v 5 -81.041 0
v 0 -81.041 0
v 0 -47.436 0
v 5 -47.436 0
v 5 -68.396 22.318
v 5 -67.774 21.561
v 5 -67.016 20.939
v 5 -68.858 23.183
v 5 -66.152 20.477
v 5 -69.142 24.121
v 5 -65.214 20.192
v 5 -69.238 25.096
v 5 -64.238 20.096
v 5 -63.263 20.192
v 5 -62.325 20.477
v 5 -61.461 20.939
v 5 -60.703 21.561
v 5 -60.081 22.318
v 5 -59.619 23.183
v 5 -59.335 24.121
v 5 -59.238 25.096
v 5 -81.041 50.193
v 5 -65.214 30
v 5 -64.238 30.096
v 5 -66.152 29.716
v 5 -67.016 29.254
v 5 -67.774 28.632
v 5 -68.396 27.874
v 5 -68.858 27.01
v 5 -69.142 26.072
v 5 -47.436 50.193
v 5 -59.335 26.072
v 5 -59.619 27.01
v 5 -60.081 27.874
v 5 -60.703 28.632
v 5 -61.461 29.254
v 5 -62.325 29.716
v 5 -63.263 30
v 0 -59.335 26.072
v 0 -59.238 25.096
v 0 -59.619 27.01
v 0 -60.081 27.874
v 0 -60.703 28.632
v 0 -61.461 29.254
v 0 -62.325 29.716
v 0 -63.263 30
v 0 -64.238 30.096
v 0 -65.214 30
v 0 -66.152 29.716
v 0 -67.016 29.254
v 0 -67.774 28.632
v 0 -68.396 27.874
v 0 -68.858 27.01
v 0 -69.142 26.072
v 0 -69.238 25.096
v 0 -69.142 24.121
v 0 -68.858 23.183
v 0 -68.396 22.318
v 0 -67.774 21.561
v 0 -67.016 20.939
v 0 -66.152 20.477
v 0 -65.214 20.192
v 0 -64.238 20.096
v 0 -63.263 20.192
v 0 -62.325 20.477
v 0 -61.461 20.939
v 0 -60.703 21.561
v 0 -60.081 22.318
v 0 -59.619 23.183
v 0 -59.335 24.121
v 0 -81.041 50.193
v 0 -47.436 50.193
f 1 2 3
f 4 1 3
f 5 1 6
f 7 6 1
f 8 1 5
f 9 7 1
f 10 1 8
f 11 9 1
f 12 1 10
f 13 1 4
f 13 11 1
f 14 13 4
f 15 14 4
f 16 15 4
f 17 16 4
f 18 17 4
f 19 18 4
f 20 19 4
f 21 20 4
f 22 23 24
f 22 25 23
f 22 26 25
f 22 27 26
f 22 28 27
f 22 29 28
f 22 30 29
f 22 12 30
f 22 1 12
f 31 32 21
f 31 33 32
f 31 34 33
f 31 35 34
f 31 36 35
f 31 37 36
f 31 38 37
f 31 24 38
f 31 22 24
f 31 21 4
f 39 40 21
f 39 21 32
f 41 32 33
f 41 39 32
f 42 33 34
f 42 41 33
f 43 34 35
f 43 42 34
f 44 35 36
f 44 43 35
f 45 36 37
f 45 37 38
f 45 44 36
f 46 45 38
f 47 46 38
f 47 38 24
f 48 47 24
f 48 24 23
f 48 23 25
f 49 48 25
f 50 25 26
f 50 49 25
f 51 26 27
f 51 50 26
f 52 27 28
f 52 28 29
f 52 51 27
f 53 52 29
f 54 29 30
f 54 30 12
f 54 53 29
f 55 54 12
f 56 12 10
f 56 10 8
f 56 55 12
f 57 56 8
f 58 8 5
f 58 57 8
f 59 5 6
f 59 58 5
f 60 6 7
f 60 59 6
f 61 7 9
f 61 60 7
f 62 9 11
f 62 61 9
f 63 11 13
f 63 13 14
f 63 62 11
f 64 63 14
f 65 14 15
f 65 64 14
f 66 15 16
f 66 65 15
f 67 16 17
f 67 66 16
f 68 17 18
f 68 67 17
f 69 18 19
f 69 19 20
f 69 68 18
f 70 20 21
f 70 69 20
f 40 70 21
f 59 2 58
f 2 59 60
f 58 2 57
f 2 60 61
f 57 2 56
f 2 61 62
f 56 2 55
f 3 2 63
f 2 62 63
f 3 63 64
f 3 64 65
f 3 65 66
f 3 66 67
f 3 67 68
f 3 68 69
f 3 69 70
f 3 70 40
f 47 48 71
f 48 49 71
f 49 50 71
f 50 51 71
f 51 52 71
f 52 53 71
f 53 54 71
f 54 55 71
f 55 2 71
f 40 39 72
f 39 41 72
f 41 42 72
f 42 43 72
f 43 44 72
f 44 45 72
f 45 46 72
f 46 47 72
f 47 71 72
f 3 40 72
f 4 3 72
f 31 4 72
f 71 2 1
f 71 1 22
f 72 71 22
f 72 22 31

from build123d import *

# Parameters (mm, degrees)
F0_W     = 73.6056677997
F0_H     = 50.1926615834
F0_R     = 5
F1_DEPTH = 5
F3_DEPTH = 20
F4_DEPTH = 20


with BuildPart() as f1:
    # F0 (on Right) → F1 (new body)
    with BuildSketch(Plane.YZ):
        with Locations((-64.2384514213, 25.0963307917)):
            Rectangle(F0_W, F0_H)
        with Locations((-64.2384514213, 25.0963307917)):
            Circle(F0_R, mode=Mode.SUBTRACT)
    extrude(amount=F1_DEPTH)

    # F3 (cut): a face of the model
    f3_faces = [f1.faces().sort_by_distance(p)[0] for p in [
        (2.5, -101.0412853211, 25.0963307917),
    ]]
    extrude(f3_faces, amount=-F3_DEPTH, mode=Mode.SUBTRACT)

    # F4 (cut): a face of the model
    f4_faces = [f1.faces().sort_by_distance(p)[0] for p in [
        (2.5, -27.4356175214, 25.0963307917),
    ]]
    extrude(f4_faces, amount=-F4_DEPTH, mode=Mode.SUBTRACT)


solid = f1.part
